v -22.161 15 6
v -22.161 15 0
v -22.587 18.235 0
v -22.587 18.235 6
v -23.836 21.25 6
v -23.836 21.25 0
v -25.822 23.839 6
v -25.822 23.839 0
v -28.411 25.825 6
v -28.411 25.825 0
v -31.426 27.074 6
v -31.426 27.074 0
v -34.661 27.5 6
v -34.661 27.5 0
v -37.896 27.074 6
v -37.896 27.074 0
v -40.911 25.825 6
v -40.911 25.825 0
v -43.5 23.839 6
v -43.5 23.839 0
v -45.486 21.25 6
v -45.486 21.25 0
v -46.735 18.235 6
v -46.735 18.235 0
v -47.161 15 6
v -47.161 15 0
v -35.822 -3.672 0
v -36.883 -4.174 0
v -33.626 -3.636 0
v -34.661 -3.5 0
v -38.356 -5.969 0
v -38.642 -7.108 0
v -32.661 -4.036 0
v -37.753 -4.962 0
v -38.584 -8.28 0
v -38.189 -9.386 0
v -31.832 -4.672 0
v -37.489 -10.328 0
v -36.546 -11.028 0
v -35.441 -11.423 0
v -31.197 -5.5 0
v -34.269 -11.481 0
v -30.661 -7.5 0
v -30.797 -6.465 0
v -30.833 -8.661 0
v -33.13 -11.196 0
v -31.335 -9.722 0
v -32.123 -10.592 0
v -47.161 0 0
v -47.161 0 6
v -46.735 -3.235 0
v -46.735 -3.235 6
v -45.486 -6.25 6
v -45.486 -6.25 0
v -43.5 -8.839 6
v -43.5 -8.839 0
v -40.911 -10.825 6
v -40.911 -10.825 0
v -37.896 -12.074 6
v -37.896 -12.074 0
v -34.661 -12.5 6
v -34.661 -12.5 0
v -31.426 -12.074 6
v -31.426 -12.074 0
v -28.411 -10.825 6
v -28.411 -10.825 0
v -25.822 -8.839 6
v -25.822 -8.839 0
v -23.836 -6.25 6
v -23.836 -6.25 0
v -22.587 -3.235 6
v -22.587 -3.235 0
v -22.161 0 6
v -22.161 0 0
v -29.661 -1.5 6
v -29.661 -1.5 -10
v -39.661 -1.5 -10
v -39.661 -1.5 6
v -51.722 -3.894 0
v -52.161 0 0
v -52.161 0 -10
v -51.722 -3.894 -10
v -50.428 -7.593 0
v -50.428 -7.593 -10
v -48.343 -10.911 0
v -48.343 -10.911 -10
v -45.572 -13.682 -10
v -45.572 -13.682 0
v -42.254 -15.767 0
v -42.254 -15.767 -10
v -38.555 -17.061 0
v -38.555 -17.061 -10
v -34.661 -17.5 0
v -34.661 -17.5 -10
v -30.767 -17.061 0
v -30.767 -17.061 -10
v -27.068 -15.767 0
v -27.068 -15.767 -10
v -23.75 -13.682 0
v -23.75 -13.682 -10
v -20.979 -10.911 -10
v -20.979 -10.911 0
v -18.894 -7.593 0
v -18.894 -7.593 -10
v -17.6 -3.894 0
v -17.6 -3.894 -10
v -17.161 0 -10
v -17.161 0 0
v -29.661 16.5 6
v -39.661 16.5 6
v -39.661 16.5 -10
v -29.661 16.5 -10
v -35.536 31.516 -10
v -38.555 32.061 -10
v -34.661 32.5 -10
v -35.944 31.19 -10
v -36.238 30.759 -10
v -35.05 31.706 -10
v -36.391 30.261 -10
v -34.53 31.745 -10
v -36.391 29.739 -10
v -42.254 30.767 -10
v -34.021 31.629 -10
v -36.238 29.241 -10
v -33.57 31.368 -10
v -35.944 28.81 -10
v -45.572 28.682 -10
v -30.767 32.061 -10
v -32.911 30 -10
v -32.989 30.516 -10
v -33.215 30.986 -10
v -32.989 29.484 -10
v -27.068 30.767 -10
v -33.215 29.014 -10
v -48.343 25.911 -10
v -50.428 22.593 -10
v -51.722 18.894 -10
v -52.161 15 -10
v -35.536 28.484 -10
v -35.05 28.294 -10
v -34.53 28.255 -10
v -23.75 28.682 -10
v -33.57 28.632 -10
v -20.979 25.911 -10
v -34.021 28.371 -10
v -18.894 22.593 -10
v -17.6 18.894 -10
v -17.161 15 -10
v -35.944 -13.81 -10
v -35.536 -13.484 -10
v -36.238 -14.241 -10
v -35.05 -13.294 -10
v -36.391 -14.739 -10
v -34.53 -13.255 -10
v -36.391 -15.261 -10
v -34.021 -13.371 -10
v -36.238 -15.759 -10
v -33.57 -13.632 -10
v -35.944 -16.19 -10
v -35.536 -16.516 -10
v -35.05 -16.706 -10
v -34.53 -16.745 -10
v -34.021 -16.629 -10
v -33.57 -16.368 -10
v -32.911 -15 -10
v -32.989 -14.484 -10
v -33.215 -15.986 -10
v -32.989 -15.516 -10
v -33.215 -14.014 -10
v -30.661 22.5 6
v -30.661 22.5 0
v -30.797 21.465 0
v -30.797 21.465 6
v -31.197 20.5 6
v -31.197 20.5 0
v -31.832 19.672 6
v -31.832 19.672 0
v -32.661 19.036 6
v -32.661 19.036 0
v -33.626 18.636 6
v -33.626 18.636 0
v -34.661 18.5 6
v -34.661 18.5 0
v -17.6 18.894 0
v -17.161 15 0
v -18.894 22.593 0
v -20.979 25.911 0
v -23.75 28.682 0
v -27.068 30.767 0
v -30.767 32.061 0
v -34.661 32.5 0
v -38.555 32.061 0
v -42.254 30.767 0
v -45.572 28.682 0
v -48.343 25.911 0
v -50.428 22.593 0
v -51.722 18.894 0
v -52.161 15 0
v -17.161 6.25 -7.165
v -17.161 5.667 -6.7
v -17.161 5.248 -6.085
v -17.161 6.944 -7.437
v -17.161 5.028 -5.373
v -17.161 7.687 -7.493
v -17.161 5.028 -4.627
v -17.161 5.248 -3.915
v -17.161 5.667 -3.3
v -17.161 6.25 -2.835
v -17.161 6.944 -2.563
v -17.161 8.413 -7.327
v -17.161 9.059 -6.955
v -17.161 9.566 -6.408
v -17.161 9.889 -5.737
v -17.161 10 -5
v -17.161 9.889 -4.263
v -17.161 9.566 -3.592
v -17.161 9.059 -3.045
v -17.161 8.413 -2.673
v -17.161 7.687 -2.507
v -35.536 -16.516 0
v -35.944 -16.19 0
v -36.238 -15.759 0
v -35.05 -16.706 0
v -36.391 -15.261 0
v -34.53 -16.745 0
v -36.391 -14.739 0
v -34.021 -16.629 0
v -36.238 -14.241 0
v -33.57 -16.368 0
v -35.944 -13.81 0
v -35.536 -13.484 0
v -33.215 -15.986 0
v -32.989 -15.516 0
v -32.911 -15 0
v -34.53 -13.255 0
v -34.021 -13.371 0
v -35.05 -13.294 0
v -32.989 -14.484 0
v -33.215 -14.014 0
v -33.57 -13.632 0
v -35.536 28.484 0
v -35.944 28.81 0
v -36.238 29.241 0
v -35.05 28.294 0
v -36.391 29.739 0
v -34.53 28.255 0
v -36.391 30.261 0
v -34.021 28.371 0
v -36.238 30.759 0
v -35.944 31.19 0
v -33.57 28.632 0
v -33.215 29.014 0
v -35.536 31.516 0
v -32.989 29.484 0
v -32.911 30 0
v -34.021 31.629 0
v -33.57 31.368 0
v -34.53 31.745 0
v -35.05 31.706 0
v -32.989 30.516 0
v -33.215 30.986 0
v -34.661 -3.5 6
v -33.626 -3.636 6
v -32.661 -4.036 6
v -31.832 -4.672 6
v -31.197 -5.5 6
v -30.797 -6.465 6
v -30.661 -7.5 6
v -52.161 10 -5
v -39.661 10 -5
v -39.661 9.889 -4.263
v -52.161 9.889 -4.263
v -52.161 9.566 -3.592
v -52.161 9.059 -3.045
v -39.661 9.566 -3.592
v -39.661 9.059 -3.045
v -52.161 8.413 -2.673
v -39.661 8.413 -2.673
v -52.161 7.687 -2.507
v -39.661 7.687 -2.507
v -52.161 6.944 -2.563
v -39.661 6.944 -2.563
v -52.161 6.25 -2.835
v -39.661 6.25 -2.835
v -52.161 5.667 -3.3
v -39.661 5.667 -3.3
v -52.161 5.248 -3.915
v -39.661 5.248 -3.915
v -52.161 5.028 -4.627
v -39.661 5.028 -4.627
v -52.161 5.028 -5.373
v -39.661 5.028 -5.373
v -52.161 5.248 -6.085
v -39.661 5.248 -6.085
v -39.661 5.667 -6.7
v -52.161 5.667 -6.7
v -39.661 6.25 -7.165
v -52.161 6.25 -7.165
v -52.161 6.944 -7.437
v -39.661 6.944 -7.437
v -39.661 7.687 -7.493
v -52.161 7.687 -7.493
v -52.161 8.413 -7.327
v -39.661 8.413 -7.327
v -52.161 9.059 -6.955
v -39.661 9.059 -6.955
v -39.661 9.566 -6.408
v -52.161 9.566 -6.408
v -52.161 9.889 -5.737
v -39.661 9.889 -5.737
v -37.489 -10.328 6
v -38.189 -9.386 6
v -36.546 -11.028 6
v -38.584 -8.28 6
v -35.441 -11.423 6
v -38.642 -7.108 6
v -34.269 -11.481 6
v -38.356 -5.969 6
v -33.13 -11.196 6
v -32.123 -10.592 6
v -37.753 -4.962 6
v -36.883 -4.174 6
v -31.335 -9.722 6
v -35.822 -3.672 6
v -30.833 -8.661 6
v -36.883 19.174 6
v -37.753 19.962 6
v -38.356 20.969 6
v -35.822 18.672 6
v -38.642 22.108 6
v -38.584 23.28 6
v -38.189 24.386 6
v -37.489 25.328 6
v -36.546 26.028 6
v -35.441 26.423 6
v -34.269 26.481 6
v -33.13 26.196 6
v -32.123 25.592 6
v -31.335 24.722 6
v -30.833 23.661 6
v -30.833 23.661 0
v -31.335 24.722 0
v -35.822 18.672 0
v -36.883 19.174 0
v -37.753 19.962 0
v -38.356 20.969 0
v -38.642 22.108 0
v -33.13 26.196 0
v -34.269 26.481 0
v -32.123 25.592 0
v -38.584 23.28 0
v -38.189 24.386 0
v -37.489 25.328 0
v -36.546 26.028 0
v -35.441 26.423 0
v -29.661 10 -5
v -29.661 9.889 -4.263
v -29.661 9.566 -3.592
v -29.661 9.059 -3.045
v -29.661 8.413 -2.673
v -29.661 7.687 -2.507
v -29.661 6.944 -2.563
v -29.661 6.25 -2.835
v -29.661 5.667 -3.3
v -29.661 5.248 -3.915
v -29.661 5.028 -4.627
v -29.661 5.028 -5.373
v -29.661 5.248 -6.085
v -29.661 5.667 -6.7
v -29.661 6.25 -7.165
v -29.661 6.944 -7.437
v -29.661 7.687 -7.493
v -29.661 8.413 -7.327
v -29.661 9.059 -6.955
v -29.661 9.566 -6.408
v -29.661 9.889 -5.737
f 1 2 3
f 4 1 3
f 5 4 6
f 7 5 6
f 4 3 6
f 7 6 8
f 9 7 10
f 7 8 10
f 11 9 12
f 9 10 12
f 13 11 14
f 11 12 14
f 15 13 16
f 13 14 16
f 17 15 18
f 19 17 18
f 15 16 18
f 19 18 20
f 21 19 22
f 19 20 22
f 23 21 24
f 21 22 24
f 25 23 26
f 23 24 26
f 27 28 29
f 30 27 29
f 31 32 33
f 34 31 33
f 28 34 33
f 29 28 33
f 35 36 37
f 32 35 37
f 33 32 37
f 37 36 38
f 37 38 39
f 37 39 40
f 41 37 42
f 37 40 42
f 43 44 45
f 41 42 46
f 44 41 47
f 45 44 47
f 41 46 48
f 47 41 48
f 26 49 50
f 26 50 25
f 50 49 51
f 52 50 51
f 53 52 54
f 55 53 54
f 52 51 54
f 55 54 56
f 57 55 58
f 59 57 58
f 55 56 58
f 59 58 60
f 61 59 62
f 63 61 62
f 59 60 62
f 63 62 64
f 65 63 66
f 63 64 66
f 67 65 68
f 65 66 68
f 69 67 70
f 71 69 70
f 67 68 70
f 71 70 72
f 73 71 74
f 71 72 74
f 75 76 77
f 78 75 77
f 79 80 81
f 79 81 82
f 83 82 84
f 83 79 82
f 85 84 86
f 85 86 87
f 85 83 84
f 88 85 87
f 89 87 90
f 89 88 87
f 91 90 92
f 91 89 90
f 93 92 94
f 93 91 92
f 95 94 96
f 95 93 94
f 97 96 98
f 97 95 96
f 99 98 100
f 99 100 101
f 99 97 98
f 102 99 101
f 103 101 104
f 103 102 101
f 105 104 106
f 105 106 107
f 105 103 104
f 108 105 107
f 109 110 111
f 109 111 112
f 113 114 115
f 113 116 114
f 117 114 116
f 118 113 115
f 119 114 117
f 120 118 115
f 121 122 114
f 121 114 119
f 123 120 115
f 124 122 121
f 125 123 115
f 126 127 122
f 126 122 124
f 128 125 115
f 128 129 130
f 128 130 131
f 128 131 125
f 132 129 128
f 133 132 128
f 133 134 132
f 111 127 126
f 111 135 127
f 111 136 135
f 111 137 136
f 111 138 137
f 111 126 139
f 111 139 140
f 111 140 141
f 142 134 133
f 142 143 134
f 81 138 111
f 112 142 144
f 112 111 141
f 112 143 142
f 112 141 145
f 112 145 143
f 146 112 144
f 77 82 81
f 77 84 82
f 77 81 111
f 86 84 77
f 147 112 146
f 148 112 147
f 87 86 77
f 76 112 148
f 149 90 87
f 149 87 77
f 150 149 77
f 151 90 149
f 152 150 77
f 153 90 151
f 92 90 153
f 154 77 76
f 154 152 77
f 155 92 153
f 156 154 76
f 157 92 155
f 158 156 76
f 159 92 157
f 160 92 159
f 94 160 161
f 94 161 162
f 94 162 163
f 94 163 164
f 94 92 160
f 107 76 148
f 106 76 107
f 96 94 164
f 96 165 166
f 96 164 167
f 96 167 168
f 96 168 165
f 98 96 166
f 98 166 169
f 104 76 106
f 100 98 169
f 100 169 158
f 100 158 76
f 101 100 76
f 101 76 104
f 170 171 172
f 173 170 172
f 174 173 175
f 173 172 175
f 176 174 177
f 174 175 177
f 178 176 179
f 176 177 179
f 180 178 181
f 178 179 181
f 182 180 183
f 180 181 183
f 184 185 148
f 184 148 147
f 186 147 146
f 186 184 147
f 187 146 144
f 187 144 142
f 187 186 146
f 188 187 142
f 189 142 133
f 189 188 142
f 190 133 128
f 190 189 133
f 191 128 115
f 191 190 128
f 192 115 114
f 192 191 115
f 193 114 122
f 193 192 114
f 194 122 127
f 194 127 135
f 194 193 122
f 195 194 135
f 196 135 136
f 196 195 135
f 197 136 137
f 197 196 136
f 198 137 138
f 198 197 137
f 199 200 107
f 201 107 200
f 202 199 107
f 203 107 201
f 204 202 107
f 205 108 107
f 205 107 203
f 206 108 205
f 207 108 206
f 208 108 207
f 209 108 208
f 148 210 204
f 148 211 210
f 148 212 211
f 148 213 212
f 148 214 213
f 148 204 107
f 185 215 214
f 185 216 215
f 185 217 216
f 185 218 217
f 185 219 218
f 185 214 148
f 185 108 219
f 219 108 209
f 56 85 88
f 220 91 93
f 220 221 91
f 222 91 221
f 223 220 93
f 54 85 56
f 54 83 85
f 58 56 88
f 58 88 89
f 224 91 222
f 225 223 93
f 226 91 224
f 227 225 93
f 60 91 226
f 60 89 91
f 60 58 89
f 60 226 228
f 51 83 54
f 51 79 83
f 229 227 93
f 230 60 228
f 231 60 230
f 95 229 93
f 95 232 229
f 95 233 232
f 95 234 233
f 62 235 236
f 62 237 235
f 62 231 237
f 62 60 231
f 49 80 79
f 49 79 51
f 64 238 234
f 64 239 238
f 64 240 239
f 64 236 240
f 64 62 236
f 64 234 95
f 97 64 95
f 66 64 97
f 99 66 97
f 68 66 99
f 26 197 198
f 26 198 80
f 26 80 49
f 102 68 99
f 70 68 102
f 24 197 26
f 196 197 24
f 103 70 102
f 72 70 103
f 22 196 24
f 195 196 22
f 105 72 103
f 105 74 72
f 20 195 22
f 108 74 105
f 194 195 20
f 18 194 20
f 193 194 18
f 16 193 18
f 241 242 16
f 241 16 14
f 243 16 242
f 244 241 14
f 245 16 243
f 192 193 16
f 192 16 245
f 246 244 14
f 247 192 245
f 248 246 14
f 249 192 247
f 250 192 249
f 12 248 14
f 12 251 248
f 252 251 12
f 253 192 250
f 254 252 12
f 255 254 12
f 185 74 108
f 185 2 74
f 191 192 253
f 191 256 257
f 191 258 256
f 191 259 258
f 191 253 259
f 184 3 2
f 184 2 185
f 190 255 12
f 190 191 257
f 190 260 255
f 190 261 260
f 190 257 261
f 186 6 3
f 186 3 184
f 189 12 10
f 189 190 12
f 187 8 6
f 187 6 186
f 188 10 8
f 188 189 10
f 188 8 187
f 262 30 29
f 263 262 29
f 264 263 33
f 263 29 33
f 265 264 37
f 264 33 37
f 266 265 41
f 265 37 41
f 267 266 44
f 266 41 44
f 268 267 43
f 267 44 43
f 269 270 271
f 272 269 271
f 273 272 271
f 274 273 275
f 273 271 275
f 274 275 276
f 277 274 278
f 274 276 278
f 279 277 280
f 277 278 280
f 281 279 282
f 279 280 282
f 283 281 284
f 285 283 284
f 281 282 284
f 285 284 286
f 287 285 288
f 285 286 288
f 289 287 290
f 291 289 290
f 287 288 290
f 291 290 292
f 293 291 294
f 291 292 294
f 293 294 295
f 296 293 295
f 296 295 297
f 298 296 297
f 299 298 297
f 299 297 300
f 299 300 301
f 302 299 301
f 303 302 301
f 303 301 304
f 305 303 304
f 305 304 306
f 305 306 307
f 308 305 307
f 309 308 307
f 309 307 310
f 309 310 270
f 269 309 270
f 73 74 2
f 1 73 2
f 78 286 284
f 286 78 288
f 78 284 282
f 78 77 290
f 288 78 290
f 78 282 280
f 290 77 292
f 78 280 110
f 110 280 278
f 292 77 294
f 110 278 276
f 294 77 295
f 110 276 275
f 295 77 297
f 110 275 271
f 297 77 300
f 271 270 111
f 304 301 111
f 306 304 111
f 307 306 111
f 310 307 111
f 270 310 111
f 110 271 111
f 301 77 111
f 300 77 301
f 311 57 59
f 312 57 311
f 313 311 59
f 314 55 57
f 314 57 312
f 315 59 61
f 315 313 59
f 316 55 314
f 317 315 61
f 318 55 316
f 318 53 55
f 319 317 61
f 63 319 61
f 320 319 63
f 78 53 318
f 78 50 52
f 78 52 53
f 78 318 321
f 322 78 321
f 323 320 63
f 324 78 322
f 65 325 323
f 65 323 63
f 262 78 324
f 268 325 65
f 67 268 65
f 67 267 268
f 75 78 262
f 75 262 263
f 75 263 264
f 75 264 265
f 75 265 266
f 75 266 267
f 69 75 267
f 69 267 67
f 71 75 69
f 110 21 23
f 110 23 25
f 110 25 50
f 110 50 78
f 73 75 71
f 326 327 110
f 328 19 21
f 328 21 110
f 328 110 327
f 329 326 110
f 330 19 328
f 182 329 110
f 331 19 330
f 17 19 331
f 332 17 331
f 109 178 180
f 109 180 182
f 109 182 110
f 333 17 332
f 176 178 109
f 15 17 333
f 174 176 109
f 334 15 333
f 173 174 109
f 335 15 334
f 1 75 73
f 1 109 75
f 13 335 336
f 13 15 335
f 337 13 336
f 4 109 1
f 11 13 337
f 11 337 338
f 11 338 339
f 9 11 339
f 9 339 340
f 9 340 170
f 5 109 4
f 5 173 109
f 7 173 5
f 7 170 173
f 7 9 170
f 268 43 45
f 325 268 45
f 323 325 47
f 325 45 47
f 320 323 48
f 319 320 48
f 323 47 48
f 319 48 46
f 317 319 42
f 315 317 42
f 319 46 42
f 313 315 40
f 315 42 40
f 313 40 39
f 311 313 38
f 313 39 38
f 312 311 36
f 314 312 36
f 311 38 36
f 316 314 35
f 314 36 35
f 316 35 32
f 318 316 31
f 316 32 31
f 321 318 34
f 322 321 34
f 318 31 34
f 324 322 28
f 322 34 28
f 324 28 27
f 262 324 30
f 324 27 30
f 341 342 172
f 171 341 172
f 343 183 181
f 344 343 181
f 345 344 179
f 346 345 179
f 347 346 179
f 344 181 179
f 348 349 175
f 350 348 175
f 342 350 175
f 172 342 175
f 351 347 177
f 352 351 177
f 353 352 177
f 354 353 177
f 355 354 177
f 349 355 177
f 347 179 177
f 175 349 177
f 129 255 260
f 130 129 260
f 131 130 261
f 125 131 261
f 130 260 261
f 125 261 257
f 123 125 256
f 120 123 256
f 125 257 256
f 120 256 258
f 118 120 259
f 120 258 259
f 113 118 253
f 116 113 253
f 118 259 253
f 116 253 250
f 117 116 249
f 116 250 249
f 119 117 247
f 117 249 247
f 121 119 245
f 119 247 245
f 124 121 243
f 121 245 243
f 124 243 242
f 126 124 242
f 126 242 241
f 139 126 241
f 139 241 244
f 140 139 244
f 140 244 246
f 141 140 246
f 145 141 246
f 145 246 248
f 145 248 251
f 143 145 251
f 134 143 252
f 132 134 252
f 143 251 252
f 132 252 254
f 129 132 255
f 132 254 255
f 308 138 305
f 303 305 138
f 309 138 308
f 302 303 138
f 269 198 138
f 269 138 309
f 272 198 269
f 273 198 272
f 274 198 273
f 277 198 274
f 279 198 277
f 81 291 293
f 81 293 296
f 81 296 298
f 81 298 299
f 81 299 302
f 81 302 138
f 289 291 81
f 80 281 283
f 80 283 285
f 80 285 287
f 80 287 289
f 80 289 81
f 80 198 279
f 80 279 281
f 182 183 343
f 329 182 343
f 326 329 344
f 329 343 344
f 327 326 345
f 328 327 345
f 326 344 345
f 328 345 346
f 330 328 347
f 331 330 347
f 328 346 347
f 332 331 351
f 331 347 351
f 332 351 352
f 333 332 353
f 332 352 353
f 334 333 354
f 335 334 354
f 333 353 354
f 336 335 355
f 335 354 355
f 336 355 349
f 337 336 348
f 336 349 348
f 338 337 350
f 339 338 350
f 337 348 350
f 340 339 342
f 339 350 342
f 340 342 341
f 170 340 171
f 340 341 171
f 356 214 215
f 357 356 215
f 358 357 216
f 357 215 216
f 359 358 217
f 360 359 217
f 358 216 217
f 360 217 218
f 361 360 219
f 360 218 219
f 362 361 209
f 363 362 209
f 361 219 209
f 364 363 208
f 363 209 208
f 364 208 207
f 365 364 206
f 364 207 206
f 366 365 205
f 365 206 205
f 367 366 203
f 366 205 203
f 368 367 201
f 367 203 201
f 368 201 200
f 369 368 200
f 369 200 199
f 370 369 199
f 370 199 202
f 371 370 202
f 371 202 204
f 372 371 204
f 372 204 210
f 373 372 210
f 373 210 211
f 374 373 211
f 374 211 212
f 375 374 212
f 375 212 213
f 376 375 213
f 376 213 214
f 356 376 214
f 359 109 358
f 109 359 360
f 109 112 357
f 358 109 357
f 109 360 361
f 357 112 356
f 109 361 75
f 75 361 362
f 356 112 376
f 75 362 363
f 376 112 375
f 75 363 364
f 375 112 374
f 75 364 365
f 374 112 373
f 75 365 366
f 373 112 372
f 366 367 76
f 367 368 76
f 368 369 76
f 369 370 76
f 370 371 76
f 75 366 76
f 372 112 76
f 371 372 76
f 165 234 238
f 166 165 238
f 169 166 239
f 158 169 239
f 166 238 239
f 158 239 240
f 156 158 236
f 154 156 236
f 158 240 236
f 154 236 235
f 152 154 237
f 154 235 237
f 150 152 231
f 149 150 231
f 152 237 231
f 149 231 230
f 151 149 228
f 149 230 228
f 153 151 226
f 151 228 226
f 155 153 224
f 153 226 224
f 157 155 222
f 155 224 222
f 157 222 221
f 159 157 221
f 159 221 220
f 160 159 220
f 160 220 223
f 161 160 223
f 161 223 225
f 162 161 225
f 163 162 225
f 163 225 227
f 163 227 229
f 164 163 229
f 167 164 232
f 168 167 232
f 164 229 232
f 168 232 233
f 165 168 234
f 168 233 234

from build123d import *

# Parameters (mm, degrees)
F0_W      = 25
F0_H      = 15
F1_DEPTH  = 6
F3_DEPTH  = 10
F5_D      = 5
F6_W      = 10
F6_H      = 15
F7_DEPTH  = 16
F8_DEPTH  = 25.4
F9_DEPTH  = 10
F10_R     = 1.75
F11_DEPTH = 10


with BuildPart() as f1:
    # F0 (on Top) → F1 (new body)
    with BuildSketch(Plane.XY):
        with BuildLine():
            ThreePointArc((-22.1608236432, 15), (-34.6608236432, 27.5), (-47.1608236432, 15))
            Line((-47.1608236432, 15), (-22.1608236432, 15))
        make_face()
        with Locations((-34.6608236432, 7.5)):
            Rectangle(F0_W, F0_H)
        with BuildLine():
            Line((-22.1608236432, 0), (-47.1608236432, 0))
            ThreePointArc((-47.1608236432, 0), (-34.6608236432, -12.5), (-22.1608236432, 0))
        make_face()
    extrude(amount=F1_DEPTH)

    # F2 (on Top) → F3 (join)
    with BuildSketch(Plane.XY):
        with BuildLine():
            Line((-17.1608236432, 0), (-17.1608236432, 15))
            ThreePointArc((-17.1608236432, 15), (-34.6608236432, 32.5), (-52.1608236432, 15))
            Line((-52.1608236432, 15), (-52.1608236432, 0))
            ThreePointArc((-52.1608236432, 0), (-34.6608236432, -17.5), (-17.1608236432, 0))
        make_face()
    extrude(amount=-F3_DEPTH)

    # F5 (through all)
    with Locations(Plane(origin=(-52.1608236432, 0, 0), x_dir=(0, -1, 0), z_dir=(-1, 0, 0))):
        with Locations((-7.5, -5)):
            Hole(F5_D / 2)

    # F6 (on face) → F7 (cut, through all)
    with BuildSketch(Plane(origin=(0, 0, -10), x_dir=(1, 0, 0), z_dir=(0, 0, -1))):
        Polygon((-39.6608236432, 1.5), (-39.6608236432, 0), (-29.6608236432, 0), (-29.6608236432, 1.5), (-34.6608236432, 1.5), align=None)
        with Locations((-34.6608236432, -7.5)):
            Rectangle(F6_W, F6_H)
        Polygon((-29.6608236432, -15), (-39.6608236432, -15), (-39.6608236432, -16.5), (-34.6608236432, -16.5), (-29.6608236432, -16.5), align=None)
    extrude(amount=-F7_DEPTH, mode=Mode.SUBTRACT)

    # F6 (on face) → F8 (cut)
    with BuildSketch(Plane(origin=(0, 0, -10), x_dir=(1, 0, 0), z_dir=(0, 0, -1))):
        with BuildLine():
            ThreePointArc((-30.6608236432, -22.5), (-31.8323965185, -19.6715728753), (-34.6608236432, -18.5))
            ThreePointArc((-34.6608236432, -18.5), (-37.489250768, -25.3284271247), (-30.6608236432, -22.5))
        make_face()
        with BuildLine():
            ThreePointArc((-30.6608236432, 7.5), (-37.489250768, 10.3284271247), (-34.6608236432, 3.5))
            ThreePointArc((-34.6608236432, 3.5), (-31.8323965185, 4.6715728753), (-30.6608236432, 7.5))
        make_face()
    extrude(amount=-F8_DEPTH, mode=Mode.SUBTRACT)

    # F6 (on face) → F9 (join)
    with BuildSketch(Plane(origin=(0, 0, -10), x_dir=(1, 0, 0), z_dir=(0, 0, -1))):
        with BuildLine():
            ThreePointArc((-30.6608236432, -22.5), (-31.8323965185, -19.6715728753), (-34.6608236432, -18.5))
            ThreePointArc((-34.6608236432, -18.5), (-37.489250768, -25.3284271247), (-30.6608236432, -22.5))
        make_face()
        with BuildLine():
            ThreePointArc((-30.6608236432, 7.5), (-37.489250768, 10.3284271247), (-34.6608236432, 3.5))
            ThreePointArc((-34.6608236432, 3.5), (-31.8323965185, 4.6715728753), (-30.6608236432, 7.5))
        make_face()
    extrude(amount=-F9_DEPTH)

    # F10 (on face) → F11 (cut)
    with BuildSketch(Plane.XY):
        with Locations((-34.6608236432, 30)):
            Circle(F10_R)
        with Locations((-34.6608236432, -15)):
            Circle(F10_R)
    extrude(amount=-F11_DEPTH, mode=Mode.SUBTRACT)


solid = f1.part
